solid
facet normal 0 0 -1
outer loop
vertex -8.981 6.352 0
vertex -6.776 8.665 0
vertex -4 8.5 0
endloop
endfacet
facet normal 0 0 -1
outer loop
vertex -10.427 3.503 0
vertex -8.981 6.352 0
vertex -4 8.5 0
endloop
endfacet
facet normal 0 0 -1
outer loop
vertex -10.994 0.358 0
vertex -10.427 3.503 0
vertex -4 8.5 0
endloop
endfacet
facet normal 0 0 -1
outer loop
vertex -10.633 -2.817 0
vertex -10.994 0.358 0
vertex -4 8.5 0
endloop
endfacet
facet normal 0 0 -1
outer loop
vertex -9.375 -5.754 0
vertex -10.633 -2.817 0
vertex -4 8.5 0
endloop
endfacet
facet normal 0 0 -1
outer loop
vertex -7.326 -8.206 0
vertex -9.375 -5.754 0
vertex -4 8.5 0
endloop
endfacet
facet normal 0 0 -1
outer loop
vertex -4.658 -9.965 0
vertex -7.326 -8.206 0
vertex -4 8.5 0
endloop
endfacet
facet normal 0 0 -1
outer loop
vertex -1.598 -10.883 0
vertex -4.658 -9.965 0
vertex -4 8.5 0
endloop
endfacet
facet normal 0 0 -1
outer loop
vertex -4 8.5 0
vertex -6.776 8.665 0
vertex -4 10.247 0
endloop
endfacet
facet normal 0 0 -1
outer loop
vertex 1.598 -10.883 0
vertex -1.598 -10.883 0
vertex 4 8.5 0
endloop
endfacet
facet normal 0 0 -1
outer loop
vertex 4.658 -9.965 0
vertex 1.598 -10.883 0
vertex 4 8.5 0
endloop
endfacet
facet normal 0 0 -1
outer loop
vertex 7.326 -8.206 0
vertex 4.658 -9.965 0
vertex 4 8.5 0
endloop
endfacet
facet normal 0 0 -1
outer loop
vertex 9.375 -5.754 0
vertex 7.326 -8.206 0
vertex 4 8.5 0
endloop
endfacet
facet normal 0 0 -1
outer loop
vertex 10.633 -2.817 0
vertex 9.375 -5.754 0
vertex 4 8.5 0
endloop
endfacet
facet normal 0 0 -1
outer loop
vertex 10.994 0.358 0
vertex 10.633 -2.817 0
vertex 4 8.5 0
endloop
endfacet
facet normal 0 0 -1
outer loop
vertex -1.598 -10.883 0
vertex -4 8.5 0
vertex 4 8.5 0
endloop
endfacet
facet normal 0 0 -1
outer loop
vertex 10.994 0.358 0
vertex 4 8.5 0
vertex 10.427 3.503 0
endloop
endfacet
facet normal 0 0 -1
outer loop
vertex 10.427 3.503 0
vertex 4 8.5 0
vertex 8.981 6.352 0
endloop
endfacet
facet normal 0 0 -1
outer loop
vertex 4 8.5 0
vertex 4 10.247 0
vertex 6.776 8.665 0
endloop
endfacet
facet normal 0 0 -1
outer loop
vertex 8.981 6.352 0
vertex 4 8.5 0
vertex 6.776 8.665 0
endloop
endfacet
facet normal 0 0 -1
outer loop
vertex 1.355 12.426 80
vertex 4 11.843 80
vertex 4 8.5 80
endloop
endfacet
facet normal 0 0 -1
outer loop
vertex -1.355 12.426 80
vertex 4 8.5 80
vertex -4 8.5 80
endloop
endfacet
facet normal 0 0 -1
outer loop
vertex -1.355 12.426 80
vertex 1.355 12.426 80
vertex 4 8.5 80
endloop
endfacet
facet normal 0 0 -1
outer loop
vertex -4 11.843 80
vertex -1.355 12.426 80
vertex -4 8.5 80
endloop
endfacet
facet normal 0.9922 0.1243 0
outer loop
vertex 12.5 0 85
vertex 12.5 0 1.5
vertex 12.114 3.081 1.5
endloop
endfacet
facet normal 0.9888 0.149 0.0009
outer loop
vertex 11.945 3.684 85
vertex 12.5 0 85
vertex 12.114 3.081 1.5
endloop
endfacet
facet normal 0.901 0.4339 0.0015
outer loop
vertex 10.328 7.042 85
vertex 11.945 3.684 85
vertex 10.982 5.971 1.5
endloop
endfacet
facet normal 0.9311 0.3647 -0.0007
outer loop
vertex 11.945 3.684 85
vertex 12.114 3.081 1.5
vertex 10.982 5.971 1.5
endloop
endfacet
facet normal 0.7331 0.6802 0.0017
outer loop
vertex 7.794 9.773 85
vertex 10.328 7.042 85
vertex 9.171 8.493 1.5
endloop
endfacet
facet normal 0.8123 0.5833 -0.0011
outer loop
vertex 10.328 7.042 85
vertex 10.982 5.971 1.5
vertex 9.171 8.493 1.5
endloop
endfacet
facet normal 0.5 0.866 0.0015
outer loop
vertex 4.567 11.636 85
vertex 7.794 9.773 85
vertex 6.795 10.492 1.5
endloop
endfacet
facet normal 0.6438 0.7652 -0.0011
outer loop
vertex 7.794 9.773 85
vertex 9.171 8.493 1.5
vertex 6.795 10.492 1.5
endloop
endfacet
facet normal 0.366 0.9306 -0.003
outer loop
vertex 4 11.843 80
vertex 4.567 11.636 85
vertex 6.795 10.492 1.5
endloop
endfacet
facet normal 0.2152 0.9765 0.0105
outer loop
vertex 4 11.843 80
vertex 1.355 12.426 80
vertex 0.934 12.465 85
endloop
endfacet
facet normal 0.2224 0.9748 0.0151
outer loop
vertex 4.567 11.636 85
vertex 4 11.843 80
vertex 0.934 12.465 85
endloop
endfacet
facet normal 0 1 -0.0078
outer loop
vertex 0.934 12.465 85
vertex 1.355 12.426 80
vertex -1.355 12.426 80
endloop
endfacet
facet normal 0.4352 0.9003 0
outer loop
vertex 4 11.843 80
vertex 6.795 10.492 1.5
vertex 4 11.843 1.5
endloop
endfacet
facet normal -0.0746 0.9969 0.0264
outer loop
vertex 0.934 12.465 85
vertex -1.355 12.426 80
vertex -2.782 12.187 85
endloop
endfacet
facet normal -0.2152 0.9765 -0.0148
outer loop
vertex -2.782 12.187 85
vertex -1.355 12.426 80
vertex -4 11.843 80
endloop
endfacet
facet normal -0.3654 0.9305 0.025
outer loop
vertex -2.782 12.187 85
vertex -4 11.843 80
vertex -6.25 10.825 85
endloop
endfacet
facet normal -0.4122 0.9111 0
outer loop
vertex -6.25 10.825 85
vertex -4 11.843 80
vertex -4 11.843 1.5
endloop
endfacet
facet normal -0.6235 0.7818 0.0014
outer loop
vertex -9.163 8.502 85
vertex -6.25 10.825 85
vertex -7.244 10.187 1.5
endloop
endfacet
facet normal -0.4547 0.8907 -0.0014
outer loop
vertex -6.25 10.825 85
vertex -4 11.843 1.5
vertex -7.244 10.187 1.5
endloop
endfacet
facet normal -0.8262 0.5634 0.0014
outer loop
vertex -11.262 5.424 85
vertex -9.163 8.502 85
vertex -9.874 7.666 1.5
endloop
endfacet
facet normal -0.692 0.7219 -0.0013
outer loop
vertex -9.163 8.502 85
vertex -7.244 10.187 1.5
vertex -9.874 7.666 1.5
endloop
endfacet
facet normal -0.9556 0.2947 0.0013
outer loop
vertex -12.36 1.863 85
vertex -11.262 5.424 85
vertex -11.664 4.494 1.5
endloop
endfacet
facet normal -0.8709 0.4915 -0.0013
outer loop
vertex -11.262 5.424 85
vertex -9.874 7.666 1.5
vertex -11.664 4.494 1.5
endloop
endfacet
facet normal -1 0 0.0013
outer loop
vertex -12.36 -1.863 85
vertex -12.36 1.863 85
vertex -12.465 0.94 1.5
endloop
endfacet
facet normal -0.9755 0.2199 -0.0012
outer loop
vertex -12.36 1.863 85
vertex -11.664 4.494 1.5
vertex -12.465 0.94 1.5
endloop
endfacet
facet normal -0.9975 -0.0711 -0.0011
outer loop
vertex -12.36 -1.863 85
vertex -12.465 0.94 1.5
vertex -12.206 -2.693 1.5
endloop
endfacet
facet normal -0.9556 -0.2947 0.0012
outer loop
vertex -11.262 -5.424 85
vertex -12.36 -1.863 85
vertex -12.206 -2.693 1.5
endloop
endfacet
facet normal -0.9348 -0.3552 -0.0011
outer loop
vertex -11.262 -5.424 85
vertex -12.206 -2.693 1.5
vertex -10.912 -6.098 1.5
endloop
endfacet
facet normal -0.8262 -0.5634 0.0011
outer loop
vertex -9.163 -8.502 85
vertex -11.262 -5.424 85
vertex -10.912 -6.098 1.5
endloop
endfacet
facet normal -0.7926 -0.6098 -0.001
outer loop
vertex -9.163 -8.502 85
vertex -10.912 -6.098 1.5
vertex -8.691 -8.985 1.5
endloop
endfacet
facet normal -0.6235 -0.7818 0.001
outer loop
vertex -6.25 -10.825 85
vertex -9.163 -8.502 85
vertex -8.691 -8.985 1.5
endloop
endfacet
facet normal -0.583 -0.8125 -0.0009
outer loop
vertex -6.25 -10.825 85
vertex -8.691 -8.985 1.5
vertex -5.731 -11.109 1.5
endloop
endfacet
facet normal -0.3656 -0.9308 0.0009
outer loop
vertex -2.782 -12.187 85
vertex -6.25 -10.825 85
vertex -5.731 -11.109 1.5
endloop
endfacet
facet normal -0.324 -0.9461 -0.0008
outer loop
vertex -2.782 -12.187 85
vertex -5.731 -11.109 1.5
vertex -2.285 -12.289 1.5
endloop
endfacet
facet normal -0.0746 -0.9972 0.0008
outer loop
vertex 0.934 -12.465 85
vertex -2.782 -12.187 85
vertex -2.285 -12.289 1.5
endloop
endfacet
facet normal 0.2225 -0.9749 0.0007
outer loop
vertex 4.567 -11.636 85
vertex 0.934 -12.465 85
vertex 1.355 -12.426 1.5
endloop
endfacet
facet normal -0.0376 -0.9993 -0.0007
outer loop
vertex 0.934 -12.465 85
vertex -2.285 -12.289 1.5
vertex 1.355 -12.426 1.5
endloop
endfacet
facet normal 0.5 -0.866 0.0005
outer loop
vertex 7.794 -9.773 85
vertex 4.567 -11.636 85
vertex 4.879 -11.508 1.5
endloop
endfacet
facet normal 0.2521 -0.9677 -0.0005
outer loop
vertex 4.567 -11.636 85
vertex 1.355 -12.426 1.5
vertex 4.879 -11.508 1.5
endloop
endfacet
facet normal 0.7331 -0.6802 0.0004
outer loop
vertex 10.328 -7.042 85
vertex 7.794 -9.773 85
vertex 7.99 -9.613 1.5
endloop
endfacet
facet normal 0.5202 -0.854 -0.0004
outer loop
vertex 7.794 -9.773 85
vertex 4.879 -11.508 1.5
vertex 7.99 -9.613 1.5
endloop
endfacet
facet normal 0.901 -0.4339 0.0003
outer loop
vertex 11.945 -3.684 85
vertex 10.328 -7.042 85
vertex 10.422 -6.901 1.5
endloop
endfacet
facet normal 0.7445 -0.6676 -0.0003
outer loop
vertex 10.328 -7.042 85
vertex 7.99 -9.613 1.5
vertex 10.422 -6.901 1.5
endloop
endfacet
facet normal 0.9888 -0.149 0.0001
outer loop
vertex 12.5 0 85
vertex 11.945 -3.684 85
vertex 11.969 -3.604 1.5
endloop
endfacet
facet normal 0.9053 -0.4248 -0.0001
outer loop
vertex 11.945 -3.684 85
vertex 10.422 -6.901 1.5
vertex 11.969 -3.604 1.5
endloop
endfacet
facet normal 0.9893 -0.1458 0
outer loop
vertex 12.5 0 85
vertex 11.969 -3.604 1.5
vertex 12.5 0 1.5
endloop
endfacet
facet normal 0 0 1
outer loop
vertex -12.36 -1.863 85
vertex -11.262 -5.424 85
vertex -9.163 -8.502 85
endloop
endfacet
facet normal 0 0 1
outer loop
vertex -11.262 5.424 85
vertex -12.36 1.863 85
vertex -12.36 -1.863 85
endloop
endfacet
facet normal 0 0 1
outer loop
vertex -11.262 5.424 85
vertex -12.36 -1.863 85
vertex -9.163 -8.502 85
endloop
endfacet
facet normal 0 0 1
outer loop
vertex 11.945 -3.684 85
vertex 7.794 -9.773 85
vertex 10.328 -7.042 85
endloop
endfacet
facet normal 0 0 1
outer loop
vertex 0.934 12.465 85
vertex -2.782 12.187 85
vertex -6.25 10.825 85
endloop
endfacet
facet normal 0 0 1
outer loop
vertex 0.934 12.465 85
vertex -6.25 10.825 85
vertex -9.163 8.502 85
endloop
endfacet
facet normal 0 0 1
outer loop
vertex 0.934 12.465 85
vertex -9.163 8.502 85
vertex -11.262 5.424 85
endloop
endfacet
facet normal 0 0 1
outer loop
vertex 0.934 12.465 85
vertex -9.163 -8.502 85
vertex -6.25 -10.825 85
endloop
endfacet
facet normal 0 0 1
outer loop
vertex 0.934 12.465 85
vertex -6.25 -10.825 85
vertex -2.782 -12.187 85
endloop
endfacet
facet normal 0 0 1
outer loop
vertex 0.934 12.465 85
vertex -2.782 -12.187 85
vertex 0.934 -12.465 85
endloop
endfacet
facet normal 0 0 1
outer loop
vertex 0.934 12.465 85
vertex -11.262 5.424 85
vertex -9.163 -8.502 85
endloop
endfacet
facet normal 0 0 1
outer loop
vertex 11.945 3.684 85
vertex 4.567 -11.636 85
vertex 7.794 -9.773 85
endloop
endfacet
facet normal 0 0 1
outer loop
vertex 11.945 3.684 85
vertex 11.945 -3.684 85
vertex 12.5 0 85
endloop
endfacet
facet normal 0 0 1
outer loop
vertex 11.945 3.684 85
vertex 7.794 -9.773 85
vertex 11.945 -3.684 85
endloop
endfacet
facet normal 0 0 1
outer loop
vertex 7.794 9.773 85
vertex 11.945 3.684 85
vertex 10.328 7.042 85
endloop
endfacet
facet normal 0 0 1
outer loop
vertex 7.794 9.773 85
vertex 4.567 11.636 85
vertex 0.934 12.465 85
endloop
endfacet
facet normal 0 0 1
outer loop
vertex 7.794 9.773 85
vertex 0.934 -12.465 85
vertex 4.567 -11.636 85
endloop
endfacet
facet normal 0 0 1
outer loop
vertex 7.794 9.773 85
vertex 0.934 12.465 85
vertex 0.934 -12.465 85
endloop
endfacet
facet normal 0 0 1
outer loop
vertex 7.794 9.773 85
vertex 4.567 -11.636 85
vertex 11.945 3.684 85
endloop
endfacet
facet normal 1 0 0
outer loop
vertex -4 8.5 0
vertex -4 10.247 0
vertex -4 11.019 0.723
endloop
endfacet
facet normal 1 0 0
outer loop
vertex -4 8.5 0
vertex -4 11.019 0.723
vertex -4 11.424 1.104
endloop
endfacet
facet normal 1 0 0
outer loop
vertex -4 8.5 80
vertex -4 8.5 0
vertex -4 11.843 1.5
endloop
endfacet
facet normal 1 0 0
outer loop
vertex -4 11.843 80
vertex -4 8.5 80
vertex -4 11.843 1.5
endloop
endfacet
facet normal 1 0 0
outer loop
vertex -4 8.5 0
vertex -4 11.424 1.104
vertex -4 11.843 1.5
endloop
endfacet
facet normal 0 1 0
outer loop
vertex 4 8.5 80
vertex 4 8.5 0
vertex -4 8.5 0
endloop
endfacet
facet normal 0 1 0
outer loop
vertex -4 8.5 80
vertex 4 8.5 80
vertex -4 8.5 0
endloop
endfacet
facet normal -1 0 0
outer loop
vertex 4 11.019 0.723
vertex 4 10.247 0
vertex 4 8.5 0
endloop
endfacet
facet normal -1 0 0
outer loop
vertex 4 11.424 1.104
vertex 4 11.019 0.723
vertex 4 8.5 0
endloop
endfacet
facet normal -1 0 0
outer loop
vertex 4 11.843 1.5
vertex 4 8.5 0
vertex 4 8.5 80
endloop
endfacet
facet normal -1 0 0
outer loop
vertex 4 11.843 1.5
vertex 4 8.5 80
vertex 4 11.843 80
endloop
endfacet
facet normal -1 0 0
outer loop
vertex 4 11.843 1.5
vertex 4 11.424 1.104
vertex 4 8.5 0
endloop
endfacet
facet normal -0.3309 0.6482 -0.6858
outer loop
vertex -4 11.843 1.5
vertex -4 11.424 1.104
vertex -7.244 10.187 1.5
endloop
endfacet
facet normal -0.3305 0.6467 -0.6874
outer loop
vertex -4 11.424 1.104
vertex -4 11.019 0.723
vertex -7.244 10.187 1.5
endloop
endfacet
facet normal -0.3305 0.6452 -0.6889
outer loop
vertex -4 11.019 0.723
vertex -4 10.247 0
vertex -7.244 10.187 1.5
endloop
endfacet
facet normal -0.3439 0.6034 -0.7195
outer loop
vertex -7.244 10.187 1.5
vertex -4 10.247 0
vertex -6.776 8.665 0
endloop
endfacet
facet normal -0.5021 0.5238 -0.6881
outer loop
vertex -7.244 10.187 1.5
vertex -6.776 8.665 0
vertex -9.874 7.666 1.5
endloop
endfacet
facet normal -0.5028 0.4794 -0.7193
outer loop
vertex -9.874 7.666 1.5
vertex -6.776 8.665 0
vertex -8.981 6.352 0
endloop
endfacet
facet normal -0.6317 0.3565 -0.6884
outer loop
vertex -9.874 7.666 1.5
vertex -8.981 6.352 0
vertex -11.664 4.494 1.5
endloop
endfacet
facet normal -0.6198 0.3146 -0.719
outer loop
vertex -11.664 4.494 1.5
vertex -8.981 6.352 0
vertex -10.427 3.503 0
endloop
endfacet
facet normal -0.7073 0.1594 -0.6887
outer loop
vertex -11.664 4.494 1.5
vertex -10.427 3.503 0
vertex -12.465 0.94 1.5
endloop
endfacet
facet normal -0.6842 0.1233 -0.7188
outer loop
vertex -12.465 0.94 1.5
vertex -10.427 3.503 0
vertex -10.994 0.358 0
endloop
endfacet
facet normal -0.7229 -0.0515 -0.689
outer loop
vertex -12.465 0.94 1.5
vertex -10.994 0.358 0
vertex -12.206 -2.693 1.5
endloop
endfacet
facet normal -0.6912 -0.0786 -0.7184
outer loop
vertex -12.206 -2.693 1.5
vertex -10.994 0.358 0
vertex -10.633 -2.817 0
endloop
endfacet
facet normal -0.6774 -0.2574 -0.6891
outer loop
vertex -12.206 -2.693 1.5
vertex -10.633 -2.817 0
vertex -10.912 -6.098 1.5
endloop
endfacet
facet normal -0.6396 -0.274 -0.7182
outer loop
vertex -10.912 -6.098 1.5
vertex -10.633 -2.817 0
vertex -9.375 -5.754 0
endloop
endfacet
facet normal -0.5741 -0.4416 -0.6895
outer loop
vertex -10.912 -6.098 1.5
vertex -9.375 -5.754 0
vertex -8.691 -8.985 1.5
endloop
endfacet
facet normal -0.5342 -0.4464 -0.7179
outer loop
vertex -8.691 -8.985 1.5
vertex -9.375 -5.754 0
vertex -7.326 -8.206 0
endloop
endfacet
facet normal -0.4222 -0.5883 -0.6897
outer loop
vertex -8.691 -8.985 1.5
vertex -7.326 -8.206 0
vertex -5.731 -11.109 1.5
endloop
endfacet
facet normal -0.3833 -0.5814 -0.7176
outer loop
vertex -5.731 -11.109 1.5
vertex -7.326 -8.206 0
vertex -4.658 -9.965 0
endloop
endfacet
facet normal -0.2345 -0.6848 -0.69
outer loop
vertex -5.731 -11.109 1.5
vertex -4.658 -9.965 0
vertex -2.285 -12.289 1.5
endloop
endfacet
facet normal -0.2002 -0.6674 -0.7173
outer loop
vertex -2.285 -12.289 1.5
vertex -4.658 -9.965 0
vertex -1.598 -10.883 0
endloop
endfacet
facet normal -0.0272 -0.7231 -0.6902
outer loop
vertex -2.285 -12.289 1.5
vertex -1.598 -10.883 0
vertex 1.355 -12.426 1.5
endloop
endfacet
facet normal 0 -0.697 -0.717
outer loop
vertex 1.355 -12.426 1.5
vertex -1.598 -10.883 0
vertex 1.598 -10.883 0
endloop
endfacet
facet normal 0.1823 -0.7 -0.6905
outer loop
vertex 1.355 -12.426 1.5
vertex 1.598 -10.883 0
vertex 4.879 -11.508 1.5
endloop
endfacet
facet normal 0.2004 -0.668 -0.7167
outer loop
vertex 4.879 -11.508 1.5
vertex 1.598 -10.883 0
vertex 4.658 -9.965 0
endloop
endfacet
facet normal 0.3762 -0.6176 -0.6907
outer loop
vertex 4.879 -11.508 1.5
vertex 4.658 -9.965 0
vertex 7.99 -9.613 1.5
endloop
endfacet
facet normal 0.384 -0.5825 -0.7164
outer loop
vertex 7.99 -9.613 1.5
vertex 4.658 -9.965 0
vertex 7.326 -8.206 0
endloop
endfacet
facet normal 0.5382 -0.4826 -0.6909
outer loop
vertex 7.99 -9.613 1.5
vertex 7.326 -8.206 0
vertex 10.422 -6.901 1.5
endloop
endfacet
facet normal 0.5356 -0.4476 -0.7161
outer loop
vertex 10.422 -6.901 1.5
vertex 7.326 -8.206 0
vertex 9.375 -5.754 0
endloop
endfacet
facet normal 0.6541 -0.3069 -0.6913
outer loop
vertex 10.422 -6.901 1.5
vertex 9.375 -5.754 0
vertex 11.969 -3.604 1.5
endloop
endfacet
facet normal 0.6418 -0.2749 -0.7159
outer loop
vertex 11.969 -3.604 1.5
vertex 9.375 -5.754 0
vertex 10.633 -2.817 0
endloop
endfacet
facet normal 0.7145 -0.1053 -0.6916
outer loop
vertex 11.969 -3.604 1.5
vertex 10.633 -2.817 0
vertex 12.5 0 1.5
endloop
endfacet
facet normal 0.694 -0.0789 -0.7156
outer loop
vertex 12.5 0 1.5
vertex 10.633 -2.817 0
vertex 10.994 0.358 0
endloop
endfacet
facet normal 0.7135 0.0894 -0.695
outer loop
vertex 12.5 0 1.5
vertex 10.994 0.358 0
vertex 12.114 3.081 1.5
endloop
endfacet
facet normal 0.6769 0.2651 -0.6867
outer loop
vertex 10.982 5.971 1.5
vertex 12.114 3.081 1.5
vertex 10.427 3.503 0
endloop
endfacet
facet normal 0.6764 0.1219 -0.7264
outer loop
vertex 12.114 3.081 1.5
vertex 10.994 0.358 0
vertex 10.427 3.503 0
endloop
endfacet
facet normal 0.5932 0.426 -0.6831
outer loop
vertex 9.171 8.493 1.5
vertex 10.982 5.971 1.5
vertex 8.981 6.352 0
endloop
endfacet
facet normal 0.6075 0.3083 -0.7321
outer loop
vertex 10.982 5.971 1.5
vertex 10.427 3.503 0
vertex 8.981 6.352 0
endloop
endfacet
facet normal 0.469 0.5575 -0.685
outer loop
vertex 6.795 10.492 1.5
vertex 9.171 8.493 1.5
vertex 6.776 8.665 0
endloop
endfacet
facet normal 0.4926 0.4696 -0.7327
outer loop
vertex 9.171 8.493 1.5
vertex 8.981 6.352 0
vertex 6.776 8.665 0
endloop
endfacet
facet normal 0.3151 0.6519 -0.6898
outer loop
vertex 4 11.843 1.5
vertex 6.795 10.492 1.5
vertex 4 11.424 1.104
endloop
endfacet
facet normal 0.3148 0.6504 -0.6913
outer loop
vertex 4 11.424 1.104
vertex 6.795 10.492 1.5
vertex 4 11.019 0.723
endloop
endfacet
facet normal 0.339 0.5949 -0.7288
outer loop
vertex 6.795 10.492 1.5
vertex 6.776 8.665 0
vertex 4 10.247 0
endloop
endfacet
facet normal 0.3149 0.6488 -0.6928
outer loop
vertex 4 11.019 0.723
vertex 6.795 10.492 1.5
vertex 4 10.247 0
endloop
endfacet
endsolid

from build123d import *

# Parameters (mm, degrees)
SKETCH1_R           = 12.5
BOSS_EXTRUDE1_DEPTH = 85
SKETCH2_W           = 8
SKETCH2_H           = 8
CUT_EXTRUDE1_DEPTH  = 80
CHAMFER1_SIZE       = 1.5


with BuildPart() as part:
    # Sketch1 → Boss-Extrude1 (new body)
    with BuildSketch(Plane.XY):
        Circle(SKETCH1_R)
    extrude(amount=BOSS_EXTRUDE1_DEPTH)

    # Sketch2 → Cut-Extrude1 (cut)
    with BuildSketch(Plane(origin=(0, 0, 0), x_dir=(-1, 0, 0), z_dir=(0, 0, -1))):
        with Locations((0, 12.5)):
            Rectangle(SKETCH2_W, SKETCH2_H)
    extrude(amount=-CUT_EXTRUDE1_DEPTH, mode=Mode.SUBTRACT)

    # Chamfer1
    chamfer1_edges = [part.edges().sort_by_distance(p)[0] for p in [
        (-7.288689869, -10.155048006, 0),
    ]]
    chamfer(chamfer1_edges, length=CHAMFER1_SIZE)


solid = part.part
